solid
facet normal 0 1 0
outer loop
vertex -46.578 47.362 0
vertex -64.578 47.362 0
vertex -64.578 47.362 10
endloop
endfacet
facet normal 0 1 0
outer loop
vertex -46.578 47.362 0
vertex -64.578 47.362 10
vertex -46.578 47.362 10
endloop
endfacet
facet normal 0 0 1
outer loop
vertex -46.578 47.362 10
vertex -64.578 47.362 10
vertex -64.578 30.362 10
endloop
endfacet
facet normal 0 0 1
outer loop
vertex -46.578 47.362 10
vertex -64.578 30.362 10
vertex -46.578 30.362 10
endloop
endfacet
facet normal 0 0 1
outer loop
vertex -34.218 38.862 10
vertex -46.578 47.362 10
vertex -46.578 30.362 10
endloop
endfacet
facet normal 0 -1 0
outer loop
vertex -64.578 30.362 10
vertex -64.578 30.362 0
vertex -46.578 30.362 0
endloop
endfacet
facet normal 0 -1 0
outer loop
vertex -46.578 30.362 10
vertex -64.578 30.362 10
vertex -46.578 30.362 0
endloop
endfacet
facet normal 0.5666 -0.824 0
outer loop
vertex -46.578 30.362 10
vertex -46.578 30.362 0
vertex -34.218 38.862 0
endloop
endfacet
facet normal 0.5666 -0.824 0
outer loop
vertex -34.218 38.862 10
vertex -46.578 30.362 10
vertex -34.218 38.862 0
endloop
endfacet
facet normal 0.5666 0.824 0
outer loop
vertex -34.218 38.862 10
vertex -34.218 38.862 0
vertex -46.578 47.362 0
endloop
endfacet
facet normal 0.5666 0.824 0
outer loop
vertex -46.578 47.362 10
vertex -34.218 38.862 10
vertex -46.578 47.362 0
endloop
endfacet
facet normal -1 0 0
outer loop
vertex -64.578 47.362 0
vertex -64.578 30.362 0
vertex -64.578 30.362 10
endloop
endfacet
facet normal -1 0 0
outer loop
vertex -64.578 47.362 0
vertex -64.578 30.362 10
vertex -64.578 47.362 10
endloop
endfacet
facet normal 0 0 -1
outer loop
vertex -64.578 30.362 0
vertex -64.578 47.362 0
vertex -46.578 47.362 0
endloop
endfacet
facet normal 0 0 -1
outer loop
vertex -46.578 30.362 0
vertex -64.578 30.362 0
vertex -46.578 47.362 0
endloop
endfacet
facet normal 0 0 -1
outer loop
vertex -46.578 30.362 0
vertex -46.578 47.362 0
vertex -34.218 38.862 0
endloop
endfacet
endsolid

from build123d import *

# Parameters (mm, degrees)
F0_W     = 18
F0_H     = 17
F1_DEPTH = 10


with BuildPart() as f1:
    # F0 (on Top) → F1 (new body)
    with BuildSketch(Plane.XY):
        with Locations((-55.577677, 38.862)):
            Rectangle(F0_W, F0_H)
        Polygon((-34.21847, 38.862), (-46.577677, 47.362), (-46.577677, 30.362), align=None)
    extrude(amount=F1_DEPTH)


solid = f1.part
